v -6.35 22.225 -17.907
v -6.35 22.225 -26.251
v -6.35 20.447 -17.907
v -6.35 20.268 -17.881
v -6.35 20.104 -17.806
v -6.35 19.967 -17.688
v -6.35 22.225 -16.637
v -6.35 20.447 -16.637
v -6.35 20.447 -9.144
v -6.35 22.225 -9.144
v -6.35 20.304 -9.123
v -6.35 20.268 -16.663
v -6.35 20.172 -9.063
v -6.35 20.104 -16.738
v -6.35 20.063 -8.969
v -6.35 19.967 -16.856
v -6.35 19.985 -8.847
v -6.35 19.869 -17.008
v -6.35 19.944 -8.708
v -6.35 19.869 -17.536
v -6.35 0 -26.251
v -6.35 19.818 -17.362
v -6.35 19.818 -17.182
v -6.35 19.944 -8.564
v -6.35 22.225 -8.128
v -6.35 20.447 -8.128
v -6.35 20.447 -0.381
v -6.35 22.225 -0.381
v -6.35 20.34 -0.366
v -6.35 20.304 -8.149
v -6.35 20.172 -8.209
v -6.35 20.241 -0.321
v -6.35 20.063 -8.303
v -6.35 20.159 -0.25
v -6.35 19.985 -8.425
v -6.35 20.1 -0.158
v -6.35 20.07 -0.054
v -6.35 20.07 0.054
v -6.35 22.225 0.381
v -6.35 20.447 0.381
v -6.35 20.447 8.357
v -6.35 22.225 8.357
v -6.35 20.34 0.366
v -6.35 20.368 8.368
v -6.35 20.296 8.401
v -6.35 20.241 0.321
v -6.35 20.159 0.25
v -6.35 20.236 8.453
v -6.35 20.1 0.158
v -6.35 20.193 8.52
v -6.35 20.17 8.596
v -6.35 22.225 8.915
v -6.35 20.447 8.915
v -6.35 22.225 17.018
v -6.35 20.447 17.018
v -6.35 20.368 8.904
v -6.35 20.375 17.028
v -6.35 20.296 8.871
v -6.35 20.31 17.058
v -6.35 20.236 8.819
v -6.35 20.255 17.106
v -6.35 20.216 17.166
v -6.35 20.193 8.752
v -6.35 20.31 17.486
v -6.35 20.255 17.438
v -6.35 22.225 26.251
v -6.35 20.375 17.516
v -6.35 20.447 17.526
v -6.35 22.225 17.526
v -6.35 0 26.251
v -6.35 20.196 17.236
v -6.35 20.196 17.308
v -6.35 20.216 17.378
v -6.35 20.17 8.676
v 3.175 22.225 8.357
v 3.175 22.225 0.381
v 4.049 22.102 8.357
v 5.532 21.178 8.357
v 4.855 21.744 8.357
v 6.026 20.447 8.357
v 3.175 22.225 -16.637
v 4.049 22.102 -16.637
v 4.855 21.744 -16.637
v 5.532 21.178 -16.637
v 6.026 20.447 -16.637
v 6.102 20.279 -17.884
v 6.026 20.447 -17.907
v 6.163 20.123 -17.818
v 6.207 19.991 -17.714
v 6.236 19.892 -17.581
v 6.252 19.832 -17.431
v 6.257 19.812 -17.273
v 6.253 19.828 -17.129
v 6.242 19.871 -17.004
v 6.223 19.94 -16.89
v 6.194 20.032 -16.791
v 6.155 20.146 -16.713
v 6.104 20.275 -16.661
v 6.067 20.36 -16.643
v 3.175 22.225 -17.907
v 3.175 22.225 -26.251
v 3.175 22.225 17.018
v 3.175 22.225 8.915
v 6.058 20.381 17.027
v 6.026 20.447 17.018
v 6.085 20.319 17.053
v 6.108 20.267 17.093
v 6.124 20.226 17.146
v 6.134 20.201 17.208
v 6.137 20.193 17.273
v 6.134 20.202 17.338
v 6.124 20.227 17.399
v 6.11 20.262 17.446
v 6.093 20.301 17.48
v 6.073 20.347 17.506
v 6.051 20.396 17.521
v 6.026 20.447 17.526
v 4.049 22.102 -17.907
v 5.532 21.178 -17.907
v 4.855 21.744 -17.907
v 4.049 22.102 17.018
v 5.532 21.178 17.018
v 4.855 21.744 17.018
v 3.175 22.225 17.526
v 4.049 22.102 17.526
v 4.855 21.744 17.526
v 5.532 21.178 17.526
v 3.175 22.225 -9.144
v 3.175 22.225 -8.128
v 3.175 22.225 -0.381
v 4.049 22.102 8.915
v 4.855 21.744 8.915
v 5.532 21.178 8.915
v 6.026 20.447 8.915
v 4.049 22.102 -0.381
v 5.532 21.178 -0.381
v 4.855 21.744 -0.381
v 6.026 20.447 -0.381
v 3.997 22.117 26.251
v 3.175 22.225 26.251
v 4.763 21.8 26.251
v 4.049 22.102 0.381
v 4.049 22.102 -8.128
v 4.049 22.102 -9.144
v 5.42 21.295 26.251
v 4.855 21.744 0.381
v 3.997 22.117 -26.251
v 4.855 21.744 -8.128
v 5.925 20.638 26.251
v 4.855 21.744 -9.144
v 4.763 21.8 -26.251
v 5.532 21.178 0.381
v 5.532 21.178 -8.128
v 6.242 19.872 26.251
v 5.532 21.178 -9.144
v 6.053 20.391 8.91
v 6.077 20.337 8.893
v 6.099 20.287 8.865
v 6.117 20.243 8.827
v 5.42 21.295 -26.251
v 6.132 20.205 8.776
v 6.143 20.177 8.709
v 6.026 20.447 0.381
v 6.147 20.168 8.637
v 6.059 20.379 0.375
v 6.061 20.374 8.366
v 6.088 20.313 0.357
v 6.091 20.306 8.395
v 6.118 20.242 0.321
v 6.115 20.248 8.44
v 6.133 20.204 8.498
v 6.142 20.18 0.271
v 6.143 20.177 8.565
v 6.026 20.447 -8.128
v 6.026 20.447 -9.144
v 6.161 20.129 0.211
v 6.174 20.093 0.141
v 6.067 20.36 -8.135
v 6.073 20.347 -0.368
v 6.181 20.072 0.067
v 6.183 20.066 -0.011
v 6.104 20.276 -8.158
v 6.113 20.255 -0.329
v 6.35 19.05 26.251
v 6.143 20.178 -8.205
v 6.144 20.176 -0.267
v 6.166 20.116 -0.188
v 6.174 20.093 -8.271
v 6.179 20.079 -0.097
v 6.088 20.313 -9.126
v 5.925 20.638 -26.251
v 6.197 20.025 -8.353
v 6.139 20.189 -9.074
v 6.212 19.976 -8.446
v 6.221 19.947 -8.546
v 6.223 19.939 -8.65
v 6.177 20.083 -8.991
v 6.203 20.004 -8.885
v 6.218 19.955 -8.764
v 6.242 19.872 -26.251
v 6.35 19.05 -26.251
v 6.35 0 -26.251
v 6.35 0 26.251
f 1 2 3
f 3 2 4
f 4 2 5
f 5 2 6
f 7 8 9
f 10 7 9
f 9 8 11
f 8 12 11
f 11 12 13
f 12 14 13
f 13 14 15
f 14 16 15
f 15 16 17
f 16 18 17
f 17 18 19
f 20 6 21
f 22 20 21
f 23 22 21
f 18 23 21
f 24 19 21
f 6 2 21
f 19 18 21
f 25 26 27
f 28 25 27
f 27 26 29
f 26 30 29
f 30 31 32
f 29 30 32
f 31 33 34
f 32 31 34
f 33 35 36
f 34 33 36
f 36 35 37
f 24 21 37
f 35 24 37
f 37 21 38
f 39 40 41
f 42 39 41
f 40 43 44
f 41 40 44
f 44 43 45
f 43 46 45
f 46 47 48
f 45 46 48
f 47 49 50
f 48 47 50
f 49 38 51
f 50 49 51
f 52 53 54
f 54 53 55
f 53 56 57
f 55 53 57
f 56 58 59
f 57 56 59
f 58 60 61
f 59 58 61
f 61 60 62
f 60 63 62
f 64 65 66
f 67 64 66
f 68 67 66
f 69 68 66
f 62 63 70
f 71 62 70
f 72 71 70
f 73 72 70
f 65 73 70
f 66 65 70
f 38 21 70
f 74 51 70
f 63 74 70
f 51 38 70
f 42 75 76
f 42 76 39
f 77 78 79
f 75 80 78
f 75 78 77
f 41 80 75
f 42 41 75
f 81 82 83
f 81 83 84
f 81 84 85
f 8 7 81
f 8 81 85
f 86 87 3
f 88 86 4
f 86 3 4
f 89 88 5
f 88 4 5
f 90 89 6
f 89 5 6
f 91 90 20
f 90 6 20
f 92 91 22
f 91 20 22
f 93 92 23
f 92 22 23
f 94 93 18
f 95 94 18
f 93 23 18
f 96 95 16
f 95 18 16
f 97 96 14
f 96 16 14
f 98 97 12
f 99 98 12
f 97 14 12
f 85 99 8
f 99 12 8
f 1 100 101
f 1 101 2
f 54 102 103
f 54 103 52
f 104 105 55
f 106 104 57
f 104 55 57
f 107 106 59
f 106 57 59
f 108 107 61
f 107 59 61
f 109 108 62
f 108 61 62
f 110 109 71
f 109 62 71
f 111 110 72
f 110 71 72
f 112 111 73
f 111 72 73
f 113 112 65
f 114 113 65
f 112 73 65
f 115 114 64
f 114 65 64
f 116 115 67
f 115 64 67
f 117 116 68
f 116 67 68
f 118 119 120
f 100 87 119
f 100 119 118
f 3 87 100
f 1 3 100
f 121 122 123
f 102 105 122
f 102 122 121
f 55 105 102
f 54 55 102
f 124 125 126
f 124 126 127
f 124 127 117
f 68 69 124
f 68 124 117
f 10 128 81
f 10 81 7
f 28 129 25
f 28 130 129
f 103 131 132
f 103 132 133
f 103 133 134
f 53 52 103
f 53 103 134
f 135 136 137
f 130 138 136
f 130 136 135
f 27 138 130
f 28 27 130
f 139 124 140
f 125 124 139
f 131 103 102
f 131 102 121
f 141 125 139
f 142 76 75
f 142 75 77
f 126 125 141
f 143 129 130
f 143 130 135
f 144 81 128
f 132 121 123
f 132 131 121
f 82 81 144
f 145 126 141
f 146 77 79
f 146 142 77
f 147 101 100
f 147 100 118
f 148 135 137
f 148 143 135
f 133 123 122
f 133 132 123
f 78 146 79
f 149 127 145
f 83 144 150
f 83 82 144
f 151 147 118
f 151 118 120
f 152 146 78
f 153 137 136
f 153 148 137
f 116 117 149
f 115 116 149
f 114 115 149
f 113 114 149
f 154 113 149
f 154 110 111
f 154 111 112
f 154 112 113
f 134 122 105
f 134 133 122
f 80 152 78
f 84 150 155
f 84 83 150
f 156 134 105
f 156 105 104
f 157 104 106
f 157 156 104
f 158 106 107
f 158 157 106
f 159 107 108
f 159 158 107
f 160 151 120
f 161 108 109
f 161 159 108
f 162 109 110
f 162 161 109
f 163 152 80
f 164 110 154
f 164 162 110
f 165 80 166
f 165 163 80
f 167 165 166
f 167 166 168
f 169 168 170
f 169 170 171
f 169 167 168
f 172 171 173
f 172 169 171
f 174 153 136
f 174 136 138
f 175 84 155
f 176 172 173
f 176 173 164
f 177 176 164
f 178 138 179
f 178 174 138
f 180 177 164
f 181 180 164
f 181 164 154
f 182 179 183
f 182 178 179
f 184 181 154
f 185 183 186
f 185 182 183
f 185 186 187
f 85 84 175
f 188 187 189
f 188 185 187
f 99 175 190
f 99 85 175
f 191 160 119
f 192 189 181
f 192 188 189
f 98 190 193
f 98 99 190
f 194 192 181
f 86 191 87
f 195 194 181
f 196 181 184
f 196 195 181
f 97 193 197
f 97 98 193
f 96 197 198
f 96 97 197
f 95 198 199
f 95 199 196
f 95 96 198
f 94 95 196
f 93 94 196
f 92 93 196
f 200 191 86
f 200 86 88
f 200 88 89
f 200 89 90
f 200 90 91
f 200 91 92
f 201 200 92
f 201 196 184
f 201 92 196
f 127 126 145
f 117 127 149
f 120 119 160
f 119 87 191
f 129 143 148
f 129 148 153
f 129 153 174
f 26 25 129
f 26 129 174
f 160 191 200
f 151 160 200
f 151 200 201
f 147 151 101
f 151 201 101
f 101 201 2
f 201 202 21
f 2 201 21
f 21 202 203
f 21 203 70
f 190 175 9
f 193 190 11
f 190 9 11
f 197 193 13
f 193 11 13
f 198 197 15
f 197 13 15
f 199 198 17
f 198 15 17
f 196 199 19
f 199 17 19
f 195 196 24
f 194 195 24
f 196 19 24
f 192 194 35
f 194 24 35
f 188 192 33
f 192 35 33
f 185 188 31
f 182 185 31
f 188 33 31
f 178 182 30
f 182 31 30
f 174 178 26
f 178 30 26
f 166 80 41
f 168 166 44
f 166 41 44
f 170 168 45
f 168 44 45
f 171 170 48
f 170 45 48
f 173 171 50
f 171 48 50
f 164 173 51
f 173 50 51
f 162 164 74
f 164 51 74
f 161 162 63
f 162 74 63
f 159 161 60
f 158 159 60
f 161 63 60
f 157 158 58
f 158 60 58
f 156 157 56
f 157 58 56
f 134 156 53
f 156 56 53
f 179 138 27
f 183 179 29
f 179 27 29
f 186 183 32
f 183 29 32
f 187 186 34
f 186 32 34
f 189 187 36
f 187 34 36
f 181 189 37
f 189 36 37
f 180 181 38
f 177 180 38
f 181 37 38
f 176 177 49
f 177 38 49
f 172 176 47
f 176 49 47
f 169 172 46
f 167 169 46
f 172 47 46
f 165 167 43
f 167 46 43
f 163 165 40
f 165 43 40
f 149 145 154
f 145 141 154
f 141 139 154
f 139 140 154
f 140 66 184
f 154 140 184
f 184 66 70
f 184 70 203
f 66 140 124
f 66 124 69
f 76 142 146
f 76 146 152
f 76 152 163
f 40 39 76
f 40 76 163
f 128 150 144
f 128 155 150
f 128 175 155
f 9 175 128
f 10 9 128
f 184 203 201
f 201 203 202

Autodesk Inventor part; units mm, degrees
ref_plane "YZ Plane" through (0, 0, 0) normal (1, 0, 0) x (0, 1, 0)
ref_plane "XZ Plane" through (0, 0, 0) normal (0, 1, 0) x (-1, 0, 0)
ref_plane "XY Plane" through (0, 0, 0) normal (0, 0, 1) x (1, 0, 0)
sketch "Sketch1" plane through (0, 0, 0) normal (0, 1, 0) x (-1, 0, 0)
  line L0 (6.35, 26.2509) -> (-6.35, 26.2509)
  line L1 (-6.35, 26.2509) -> (-6.35, -26.2509)
  line L2 (-6.35, -26.2509) -> (6.35, -26.2509)
  line L3 (6.35, -26.2509) -> (6.35, 26.2509)
  point P0 (0, 0)
  dimension "d0" = 6.35
  dimension "d1" = 12.7
  dimension "d2" = 52.5018
  dimension "d3" = 26.2509
extrude "Extrusion1" add sketch "Sketch1" along normal blind 22.225
fillet "Fillet1" radius 3.175 1 edges at (6.35, 22.225, 0)
sketch "Sketch2" plane through (-6.35, 0, -26.2509) normal (-1, 0, 0) x (0, 0, 1)
  line L0 (52.5018, 19.05) -> (0, 19.05) projected
  line L1 (0, 0) -> (0, 22.225) projected
  line L2 (52.5018, 0) -> (52.5018, 22.225) projected
  line L3 (8.3439, 22.225) -> (9.6139, 22.225)
  line L4 (9.6139, 22.225) -> (9.6139, 20.447)
  line L5 (9.6139, 20.447) -> (8.3439, 20.447)
  line L6 (8.3439, 20.447) -> (8.3439, 22.225)
  line L7 (17.1069, 22.225) -> (18.1229, 22.225)
  line L8 (18.1229, 22.225) -> (18.1229, 20.447)
  line L9 (18.1229, 20.447) -> (17.1069, 20.447)
  line L10 (17.1069, 20.447) -> (17.1069, 22.225)
  line L11 (25.8699, 22.225) -> (26.6319, 22.225)
  line L12 (26.6319, 22.225) -> (26.6319, 20.447)
  line L13 (26.6319, 20.447) -> (25.8699, 20.447)
  line L14 (25.8699, 20.447) -> (25.8699, 22.225)
  line L15 (34.6075, 22.225) -> (35.1663, 22.225)
  line L16 (35.1663, 22.225) -> (35.1663, 20.447)
  line L17 (35.1663, 20.447) -> (34.6075, 20.447)
  line L18 (34.6075, 20.447) -> (34.6075, 22.225)
  line L19 (43.2689, 22.225) -> (43.7769, 22.225)
  line L20 (43.7769, 22.225) -> (43.7769, 20.447)
  line L21 (43.7769, 20.447) -> (43.2689, 20.447)
  line L22 (43.2689, 20.447) -> (43.2689, 22.225)
  line L23 (8.9789, 20.447) -> (17.6149, 20.447) construction
  line L24 (17.6149, 20.447) -> (26.2509, 20.447) construction
  line L25 (26.2509, 20.447) -> (34.8869, 20.447) construction
  line L26 (34.8869, 20.447) -> (43.5229, 20.447) construction
  arc A0 (8.3439, 20.447) -> (9.6139, 20.447) centre (8.9789, 20.447) ccw
  arc A1 (17.1069, 20.447) -> (18.1229, 20.447) centre (17.6149, 20.447) ccw
  arc A2 (25.8699, 20.447) -> (26.6319, 20.447) centre (26.2509, 20.447) ccw
  arc A3 (34.6075, 20.447) -> (35.1663, 20.447) centre (34.8869, 20.447) ccw
  arc A4 (43.2689, 20.447) -> (43.7769, 20.447) centre (43.5229, 20.447) ccw
  line L27 (34.6075, 22.225) -> (35.1663, 22.225)
  line L28 (43.2689, 22.225) -> (43.7769, 22.225)
  line L29 (25.8699, 22.225) -> (26.6319, 22.225)
  line L30 (8.3439, 22.225) -> (9.6139, 22.225)
  line L31 (17.1069, 22.225) -> (18.1229, 22.225)
  line L32 (0, 22.225) -> (52.5018, 22.225) projected
  line L33 (8.9789, 20.447) -> (0, 20.447) construction
  line L34 (43.5229, 20.447) -> (52.5018, 20.447) construction
  point P0 (26.2509, 0)
  dimension "d20" = 1.27
  dimension "d21" = 1.016
  dimension "d22" = 0.762
  dimension "d23" = 0.508
  dimension "d24" = 0.5588
  dimension "d25" = 1.778
  dimension "d26" = 8.636
extrude "Extrusion4" cut sketch "Sketch2" against normal blind 25.4 contours L20 L21 L22 L19 | L3 L4 L5 L6 | A4 L21 | L5 A0 | L16 L17 L18 L15 | L7 L8 L9 L10 | A3 L17 | L9 A1 | L12 L13 L14 L11 | A2 L13
equation "\"d0\" = 0.5 * d1"
equation "\"d3\" = 0.5 * d2"
properties part number "Nut0" material "LCP Plastic"
